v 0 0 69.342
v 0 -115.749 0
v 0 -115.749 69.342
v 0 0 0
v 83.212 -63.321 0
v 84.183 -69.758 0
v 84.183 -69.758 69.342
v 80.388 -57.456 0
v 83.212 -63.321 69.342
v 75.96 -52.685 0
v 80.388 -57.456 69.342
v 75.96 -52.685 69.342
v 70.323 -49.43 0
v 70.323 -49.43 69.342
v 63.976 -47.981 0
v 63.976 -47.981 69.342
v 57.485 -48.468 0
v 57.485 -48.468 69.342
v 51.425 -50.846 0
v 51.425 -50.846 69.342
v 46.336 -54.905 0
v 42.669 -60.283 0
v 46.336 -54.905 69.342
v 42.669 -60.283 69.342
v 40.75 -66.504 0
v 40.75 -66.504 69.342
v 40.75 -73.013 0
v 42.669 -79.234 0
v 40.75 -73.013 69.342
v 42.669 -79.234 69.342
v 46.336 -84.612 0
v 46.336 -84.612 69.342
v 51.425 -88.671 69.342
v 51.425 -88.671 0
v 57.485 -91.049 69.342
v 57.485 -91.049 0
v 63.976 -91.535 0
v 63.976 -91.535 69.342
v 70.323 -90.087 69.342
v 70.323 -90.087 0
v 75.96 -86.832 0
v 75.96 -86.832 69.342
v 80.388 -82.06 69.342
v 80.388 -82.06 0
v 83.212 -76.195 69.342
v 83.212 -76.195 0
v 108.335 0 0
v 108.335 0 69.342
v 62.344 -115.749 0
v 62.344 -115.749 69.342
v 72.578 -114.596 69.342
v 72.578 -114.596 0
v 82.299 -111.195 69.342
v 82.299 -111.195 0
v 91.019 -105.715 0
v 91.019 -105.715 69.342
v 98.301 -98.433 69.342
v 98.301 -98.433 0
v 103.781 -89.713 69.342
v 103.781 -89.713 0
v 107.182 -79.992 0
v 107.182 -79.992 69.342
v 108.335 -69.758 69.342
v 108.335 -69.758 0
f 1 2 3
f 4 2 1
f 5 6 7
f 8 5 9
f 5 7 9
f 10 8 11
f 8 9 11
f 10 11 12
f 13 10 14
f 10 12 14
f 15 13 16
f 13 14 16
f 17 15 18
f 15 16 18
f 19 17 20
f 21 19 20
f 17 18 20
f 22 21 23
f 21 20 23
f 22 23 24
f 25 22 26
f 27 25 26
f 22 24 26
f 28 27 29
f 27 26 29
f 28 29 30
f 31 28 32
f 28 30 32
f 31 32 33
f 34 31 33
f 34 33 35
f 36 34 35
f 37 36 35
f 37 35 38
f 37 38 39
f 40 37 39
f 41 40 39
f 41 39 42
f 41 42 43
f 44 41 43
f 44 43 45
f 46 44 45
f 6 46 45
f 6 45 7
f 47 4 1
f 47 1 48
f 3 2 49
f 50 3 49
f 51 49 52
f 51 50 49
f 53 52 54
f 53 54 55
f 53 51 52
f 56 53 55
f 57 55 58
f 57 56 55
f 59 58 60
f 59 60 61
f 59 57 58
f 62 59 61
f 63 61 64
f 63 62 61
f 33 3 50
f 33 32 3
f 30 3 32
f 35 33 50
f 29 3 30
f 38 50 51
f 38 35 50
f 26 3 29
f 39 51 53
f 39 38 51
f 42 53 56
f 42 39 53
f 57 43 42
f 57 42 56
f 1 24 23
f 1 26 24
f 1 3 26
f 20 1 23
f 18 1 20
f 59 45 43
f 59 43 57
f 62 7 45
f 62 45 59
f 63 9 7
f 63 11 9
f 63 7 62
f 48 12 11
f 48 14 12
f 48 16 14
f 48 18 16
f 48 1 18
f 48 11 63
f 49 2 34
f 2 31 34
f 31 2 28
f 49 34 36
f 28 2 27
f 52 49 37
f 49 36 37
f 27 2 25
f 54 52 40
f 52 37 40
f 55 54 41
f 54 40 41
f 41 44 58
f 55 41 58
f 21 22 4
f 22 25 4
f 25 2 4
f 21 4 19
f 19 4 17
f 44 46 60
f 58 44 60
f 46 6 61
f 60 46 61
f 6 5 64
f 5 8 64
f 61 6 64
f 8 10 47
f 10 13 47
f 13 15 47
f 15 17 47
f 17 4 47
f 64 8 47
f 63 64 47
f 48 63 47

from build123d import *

# Parameters (mm, degrees)
F0_W     = 108.33516
F0_H     = 115.749128
F1_DEPTH = 69.342
F2_R     = 45.990768
F3_R     = 21.838167
F4_DEPTH = 89.916


with BuildPart() as f1:
    # F0 (on Top) → F1 (new body)
    with BuildSketch(Plane.XY):
        with Locations((54.16758, -57.874564)):
            Rectangle(F0_W, F0_H)
    extrude(amount=F1_DEPTH)

    # F2
    f2_edges = [f1.edges().sort_by_distance(p)[0] for p in [
        (108.33516, -115.749128, 34.671),
    ]]
    fillet(f2_edges, radius=F2_R)

    # F3 (on face) → F4 (cut)
    with BuildSketch(Plane.XY.offset(69.342)):
        with Locations((62.344391, -69.75836)):
            Circle(F3_R)
    extrude(amount=-F4_DEPTH, mode=Mode.SUBTRACT)


solid = f1.part
